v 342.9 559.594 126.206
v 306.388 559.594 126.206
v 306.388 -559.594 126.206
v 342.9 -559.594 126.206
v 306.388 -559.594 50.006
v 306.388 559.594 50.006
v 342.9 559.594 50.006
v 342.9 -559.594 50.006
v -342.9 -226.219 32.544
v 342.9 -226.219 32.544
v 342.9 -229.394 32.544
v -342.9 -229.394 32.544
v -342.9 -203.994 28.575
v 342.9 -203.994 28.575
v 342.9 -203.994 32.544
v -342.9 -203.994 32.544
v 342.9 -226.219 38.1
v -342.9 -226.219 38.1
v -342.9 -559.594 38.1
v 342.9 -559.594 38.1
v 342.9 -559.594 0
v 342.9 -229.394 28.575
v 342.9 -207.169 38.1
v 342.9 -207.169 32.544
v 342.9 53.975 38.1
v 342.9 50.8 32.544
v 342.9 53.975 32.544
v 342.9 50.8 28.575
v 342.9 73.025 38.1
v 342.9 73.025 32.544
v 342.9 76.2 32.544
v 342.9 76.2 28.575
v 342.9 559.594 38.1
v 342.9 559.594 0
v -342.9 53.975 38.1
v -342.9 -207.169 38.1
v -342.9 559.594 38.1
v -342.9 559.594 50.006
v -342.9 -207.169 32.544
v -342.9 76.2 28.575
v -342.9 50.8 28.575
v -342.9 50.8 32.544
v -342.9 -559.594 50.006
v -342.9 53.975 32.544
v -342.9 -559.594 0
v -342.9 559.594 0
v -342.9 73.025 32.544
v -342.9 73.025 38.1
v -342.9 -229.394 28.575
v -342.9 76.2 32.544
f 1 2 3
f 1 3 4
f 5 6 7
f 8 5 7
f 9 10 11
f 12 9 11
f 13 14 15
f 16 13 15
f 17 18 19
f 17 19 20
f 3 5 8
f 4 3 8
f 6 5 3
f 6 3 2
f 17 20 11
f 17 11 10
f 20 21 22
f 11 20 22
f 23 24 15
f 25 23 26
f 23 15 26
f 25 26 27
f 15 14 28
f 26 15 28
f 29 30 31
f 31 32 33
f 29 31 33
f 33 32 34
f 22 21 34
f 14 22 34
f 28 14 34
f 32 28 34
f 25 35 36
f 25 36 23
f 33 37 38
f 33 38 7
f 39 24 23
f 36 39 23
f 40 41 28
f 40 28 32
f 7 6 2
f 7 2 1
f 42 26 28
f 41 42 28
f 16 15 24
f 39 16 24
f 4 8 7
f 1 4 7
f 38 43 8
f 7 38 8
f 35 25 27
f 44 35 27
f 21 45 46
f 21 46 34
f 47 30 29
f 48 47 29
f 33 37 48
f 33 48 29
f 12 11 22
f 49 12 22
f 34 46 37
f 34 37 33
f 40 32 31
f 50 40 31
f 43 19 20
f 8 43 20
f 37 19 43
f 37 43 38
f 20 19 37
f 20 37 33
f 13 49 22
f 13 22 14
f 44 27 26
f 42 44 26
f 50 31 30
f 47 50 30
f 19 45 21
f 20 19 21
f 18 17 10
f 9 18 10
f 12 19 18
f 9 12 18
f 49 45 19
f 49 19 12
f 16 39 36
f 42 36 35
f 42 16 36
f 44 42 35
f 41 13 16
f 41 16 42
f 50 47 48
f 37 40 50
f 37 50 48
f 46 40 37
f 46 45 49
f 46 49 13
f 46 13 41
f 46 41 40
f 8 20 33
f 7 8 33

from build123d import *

# Parameters (mm, degrees)
F0_W      = 685.8
F0_H      = 1119.1875
F1_DEPTH  = 38.1
F3_DEPTH  = 685.801
F4_DEPTH  = 685.801
F7_W      = 685.8
F7_H      = 1119.1875
F8_DEPTH  = 11.90625
F9_W      = 36.5125
F9_H      = 1119.1875
F10_DEPTH = 76.2


with BuildPart() as f1:
    # F0 (on Top) → F1 (new body)
    with BuildSketch(Plane.XY):
        Rectangle(F0_W, F0_H)
    extrude(amount=F1_DEPTH)

    # F2 (on face) → F3 (cut, through all)
    with BuildSketch(Plane.YZ.offset(342.9)):
        Polygon((-207.16875, 38.1), (-226.21875, 38.1), (-226.21875, 32.54375), (-229.39375, 32.54375), (-229.39375, 28.575), (-203.99375, 28.575), (-203.99375, 32.54375), (-207.16875, 32.54375), align=None)
    extrude(amount=-F3_DEPTH, mode=Mode.SUBTRACT)

    # F2 (on face) → F4 (cut, through all)
    with BuildSketch(Plane.YZ.offset(342.9)):
        Polygon((73.025, 38.1), (53.975, 38.1), (53.975, 32.54375), (50.8, 32.54375), (50.8, 28.575), (76.2, 28.575), (76.2, 32.54375), (73.025, 32.54375), align=None)
    extrude(amount=-F4_DEPTH, mode=Mode.SUBTRACT)


with BuildPart() as f8:
    # F7 (on face) → F8 (new body)
    with BuildSketch(Plane.XY.offset(38.1)):
        Rectangle(F7_W, F7_H)
    extrude(amount=F8_DEPTH)


with BuildPart() as f10:
    # F9 (on face) → F10 (new body)
    with BuildSketch(Plane.XY.offset(50.00625)):
        with Locations((324.64375, 0)):
            Rectangle(F9_W, F9_H)
    extrude(amount=F10_DEPTH)


solid = Compound([f1.part, f8.part, f10.part])
